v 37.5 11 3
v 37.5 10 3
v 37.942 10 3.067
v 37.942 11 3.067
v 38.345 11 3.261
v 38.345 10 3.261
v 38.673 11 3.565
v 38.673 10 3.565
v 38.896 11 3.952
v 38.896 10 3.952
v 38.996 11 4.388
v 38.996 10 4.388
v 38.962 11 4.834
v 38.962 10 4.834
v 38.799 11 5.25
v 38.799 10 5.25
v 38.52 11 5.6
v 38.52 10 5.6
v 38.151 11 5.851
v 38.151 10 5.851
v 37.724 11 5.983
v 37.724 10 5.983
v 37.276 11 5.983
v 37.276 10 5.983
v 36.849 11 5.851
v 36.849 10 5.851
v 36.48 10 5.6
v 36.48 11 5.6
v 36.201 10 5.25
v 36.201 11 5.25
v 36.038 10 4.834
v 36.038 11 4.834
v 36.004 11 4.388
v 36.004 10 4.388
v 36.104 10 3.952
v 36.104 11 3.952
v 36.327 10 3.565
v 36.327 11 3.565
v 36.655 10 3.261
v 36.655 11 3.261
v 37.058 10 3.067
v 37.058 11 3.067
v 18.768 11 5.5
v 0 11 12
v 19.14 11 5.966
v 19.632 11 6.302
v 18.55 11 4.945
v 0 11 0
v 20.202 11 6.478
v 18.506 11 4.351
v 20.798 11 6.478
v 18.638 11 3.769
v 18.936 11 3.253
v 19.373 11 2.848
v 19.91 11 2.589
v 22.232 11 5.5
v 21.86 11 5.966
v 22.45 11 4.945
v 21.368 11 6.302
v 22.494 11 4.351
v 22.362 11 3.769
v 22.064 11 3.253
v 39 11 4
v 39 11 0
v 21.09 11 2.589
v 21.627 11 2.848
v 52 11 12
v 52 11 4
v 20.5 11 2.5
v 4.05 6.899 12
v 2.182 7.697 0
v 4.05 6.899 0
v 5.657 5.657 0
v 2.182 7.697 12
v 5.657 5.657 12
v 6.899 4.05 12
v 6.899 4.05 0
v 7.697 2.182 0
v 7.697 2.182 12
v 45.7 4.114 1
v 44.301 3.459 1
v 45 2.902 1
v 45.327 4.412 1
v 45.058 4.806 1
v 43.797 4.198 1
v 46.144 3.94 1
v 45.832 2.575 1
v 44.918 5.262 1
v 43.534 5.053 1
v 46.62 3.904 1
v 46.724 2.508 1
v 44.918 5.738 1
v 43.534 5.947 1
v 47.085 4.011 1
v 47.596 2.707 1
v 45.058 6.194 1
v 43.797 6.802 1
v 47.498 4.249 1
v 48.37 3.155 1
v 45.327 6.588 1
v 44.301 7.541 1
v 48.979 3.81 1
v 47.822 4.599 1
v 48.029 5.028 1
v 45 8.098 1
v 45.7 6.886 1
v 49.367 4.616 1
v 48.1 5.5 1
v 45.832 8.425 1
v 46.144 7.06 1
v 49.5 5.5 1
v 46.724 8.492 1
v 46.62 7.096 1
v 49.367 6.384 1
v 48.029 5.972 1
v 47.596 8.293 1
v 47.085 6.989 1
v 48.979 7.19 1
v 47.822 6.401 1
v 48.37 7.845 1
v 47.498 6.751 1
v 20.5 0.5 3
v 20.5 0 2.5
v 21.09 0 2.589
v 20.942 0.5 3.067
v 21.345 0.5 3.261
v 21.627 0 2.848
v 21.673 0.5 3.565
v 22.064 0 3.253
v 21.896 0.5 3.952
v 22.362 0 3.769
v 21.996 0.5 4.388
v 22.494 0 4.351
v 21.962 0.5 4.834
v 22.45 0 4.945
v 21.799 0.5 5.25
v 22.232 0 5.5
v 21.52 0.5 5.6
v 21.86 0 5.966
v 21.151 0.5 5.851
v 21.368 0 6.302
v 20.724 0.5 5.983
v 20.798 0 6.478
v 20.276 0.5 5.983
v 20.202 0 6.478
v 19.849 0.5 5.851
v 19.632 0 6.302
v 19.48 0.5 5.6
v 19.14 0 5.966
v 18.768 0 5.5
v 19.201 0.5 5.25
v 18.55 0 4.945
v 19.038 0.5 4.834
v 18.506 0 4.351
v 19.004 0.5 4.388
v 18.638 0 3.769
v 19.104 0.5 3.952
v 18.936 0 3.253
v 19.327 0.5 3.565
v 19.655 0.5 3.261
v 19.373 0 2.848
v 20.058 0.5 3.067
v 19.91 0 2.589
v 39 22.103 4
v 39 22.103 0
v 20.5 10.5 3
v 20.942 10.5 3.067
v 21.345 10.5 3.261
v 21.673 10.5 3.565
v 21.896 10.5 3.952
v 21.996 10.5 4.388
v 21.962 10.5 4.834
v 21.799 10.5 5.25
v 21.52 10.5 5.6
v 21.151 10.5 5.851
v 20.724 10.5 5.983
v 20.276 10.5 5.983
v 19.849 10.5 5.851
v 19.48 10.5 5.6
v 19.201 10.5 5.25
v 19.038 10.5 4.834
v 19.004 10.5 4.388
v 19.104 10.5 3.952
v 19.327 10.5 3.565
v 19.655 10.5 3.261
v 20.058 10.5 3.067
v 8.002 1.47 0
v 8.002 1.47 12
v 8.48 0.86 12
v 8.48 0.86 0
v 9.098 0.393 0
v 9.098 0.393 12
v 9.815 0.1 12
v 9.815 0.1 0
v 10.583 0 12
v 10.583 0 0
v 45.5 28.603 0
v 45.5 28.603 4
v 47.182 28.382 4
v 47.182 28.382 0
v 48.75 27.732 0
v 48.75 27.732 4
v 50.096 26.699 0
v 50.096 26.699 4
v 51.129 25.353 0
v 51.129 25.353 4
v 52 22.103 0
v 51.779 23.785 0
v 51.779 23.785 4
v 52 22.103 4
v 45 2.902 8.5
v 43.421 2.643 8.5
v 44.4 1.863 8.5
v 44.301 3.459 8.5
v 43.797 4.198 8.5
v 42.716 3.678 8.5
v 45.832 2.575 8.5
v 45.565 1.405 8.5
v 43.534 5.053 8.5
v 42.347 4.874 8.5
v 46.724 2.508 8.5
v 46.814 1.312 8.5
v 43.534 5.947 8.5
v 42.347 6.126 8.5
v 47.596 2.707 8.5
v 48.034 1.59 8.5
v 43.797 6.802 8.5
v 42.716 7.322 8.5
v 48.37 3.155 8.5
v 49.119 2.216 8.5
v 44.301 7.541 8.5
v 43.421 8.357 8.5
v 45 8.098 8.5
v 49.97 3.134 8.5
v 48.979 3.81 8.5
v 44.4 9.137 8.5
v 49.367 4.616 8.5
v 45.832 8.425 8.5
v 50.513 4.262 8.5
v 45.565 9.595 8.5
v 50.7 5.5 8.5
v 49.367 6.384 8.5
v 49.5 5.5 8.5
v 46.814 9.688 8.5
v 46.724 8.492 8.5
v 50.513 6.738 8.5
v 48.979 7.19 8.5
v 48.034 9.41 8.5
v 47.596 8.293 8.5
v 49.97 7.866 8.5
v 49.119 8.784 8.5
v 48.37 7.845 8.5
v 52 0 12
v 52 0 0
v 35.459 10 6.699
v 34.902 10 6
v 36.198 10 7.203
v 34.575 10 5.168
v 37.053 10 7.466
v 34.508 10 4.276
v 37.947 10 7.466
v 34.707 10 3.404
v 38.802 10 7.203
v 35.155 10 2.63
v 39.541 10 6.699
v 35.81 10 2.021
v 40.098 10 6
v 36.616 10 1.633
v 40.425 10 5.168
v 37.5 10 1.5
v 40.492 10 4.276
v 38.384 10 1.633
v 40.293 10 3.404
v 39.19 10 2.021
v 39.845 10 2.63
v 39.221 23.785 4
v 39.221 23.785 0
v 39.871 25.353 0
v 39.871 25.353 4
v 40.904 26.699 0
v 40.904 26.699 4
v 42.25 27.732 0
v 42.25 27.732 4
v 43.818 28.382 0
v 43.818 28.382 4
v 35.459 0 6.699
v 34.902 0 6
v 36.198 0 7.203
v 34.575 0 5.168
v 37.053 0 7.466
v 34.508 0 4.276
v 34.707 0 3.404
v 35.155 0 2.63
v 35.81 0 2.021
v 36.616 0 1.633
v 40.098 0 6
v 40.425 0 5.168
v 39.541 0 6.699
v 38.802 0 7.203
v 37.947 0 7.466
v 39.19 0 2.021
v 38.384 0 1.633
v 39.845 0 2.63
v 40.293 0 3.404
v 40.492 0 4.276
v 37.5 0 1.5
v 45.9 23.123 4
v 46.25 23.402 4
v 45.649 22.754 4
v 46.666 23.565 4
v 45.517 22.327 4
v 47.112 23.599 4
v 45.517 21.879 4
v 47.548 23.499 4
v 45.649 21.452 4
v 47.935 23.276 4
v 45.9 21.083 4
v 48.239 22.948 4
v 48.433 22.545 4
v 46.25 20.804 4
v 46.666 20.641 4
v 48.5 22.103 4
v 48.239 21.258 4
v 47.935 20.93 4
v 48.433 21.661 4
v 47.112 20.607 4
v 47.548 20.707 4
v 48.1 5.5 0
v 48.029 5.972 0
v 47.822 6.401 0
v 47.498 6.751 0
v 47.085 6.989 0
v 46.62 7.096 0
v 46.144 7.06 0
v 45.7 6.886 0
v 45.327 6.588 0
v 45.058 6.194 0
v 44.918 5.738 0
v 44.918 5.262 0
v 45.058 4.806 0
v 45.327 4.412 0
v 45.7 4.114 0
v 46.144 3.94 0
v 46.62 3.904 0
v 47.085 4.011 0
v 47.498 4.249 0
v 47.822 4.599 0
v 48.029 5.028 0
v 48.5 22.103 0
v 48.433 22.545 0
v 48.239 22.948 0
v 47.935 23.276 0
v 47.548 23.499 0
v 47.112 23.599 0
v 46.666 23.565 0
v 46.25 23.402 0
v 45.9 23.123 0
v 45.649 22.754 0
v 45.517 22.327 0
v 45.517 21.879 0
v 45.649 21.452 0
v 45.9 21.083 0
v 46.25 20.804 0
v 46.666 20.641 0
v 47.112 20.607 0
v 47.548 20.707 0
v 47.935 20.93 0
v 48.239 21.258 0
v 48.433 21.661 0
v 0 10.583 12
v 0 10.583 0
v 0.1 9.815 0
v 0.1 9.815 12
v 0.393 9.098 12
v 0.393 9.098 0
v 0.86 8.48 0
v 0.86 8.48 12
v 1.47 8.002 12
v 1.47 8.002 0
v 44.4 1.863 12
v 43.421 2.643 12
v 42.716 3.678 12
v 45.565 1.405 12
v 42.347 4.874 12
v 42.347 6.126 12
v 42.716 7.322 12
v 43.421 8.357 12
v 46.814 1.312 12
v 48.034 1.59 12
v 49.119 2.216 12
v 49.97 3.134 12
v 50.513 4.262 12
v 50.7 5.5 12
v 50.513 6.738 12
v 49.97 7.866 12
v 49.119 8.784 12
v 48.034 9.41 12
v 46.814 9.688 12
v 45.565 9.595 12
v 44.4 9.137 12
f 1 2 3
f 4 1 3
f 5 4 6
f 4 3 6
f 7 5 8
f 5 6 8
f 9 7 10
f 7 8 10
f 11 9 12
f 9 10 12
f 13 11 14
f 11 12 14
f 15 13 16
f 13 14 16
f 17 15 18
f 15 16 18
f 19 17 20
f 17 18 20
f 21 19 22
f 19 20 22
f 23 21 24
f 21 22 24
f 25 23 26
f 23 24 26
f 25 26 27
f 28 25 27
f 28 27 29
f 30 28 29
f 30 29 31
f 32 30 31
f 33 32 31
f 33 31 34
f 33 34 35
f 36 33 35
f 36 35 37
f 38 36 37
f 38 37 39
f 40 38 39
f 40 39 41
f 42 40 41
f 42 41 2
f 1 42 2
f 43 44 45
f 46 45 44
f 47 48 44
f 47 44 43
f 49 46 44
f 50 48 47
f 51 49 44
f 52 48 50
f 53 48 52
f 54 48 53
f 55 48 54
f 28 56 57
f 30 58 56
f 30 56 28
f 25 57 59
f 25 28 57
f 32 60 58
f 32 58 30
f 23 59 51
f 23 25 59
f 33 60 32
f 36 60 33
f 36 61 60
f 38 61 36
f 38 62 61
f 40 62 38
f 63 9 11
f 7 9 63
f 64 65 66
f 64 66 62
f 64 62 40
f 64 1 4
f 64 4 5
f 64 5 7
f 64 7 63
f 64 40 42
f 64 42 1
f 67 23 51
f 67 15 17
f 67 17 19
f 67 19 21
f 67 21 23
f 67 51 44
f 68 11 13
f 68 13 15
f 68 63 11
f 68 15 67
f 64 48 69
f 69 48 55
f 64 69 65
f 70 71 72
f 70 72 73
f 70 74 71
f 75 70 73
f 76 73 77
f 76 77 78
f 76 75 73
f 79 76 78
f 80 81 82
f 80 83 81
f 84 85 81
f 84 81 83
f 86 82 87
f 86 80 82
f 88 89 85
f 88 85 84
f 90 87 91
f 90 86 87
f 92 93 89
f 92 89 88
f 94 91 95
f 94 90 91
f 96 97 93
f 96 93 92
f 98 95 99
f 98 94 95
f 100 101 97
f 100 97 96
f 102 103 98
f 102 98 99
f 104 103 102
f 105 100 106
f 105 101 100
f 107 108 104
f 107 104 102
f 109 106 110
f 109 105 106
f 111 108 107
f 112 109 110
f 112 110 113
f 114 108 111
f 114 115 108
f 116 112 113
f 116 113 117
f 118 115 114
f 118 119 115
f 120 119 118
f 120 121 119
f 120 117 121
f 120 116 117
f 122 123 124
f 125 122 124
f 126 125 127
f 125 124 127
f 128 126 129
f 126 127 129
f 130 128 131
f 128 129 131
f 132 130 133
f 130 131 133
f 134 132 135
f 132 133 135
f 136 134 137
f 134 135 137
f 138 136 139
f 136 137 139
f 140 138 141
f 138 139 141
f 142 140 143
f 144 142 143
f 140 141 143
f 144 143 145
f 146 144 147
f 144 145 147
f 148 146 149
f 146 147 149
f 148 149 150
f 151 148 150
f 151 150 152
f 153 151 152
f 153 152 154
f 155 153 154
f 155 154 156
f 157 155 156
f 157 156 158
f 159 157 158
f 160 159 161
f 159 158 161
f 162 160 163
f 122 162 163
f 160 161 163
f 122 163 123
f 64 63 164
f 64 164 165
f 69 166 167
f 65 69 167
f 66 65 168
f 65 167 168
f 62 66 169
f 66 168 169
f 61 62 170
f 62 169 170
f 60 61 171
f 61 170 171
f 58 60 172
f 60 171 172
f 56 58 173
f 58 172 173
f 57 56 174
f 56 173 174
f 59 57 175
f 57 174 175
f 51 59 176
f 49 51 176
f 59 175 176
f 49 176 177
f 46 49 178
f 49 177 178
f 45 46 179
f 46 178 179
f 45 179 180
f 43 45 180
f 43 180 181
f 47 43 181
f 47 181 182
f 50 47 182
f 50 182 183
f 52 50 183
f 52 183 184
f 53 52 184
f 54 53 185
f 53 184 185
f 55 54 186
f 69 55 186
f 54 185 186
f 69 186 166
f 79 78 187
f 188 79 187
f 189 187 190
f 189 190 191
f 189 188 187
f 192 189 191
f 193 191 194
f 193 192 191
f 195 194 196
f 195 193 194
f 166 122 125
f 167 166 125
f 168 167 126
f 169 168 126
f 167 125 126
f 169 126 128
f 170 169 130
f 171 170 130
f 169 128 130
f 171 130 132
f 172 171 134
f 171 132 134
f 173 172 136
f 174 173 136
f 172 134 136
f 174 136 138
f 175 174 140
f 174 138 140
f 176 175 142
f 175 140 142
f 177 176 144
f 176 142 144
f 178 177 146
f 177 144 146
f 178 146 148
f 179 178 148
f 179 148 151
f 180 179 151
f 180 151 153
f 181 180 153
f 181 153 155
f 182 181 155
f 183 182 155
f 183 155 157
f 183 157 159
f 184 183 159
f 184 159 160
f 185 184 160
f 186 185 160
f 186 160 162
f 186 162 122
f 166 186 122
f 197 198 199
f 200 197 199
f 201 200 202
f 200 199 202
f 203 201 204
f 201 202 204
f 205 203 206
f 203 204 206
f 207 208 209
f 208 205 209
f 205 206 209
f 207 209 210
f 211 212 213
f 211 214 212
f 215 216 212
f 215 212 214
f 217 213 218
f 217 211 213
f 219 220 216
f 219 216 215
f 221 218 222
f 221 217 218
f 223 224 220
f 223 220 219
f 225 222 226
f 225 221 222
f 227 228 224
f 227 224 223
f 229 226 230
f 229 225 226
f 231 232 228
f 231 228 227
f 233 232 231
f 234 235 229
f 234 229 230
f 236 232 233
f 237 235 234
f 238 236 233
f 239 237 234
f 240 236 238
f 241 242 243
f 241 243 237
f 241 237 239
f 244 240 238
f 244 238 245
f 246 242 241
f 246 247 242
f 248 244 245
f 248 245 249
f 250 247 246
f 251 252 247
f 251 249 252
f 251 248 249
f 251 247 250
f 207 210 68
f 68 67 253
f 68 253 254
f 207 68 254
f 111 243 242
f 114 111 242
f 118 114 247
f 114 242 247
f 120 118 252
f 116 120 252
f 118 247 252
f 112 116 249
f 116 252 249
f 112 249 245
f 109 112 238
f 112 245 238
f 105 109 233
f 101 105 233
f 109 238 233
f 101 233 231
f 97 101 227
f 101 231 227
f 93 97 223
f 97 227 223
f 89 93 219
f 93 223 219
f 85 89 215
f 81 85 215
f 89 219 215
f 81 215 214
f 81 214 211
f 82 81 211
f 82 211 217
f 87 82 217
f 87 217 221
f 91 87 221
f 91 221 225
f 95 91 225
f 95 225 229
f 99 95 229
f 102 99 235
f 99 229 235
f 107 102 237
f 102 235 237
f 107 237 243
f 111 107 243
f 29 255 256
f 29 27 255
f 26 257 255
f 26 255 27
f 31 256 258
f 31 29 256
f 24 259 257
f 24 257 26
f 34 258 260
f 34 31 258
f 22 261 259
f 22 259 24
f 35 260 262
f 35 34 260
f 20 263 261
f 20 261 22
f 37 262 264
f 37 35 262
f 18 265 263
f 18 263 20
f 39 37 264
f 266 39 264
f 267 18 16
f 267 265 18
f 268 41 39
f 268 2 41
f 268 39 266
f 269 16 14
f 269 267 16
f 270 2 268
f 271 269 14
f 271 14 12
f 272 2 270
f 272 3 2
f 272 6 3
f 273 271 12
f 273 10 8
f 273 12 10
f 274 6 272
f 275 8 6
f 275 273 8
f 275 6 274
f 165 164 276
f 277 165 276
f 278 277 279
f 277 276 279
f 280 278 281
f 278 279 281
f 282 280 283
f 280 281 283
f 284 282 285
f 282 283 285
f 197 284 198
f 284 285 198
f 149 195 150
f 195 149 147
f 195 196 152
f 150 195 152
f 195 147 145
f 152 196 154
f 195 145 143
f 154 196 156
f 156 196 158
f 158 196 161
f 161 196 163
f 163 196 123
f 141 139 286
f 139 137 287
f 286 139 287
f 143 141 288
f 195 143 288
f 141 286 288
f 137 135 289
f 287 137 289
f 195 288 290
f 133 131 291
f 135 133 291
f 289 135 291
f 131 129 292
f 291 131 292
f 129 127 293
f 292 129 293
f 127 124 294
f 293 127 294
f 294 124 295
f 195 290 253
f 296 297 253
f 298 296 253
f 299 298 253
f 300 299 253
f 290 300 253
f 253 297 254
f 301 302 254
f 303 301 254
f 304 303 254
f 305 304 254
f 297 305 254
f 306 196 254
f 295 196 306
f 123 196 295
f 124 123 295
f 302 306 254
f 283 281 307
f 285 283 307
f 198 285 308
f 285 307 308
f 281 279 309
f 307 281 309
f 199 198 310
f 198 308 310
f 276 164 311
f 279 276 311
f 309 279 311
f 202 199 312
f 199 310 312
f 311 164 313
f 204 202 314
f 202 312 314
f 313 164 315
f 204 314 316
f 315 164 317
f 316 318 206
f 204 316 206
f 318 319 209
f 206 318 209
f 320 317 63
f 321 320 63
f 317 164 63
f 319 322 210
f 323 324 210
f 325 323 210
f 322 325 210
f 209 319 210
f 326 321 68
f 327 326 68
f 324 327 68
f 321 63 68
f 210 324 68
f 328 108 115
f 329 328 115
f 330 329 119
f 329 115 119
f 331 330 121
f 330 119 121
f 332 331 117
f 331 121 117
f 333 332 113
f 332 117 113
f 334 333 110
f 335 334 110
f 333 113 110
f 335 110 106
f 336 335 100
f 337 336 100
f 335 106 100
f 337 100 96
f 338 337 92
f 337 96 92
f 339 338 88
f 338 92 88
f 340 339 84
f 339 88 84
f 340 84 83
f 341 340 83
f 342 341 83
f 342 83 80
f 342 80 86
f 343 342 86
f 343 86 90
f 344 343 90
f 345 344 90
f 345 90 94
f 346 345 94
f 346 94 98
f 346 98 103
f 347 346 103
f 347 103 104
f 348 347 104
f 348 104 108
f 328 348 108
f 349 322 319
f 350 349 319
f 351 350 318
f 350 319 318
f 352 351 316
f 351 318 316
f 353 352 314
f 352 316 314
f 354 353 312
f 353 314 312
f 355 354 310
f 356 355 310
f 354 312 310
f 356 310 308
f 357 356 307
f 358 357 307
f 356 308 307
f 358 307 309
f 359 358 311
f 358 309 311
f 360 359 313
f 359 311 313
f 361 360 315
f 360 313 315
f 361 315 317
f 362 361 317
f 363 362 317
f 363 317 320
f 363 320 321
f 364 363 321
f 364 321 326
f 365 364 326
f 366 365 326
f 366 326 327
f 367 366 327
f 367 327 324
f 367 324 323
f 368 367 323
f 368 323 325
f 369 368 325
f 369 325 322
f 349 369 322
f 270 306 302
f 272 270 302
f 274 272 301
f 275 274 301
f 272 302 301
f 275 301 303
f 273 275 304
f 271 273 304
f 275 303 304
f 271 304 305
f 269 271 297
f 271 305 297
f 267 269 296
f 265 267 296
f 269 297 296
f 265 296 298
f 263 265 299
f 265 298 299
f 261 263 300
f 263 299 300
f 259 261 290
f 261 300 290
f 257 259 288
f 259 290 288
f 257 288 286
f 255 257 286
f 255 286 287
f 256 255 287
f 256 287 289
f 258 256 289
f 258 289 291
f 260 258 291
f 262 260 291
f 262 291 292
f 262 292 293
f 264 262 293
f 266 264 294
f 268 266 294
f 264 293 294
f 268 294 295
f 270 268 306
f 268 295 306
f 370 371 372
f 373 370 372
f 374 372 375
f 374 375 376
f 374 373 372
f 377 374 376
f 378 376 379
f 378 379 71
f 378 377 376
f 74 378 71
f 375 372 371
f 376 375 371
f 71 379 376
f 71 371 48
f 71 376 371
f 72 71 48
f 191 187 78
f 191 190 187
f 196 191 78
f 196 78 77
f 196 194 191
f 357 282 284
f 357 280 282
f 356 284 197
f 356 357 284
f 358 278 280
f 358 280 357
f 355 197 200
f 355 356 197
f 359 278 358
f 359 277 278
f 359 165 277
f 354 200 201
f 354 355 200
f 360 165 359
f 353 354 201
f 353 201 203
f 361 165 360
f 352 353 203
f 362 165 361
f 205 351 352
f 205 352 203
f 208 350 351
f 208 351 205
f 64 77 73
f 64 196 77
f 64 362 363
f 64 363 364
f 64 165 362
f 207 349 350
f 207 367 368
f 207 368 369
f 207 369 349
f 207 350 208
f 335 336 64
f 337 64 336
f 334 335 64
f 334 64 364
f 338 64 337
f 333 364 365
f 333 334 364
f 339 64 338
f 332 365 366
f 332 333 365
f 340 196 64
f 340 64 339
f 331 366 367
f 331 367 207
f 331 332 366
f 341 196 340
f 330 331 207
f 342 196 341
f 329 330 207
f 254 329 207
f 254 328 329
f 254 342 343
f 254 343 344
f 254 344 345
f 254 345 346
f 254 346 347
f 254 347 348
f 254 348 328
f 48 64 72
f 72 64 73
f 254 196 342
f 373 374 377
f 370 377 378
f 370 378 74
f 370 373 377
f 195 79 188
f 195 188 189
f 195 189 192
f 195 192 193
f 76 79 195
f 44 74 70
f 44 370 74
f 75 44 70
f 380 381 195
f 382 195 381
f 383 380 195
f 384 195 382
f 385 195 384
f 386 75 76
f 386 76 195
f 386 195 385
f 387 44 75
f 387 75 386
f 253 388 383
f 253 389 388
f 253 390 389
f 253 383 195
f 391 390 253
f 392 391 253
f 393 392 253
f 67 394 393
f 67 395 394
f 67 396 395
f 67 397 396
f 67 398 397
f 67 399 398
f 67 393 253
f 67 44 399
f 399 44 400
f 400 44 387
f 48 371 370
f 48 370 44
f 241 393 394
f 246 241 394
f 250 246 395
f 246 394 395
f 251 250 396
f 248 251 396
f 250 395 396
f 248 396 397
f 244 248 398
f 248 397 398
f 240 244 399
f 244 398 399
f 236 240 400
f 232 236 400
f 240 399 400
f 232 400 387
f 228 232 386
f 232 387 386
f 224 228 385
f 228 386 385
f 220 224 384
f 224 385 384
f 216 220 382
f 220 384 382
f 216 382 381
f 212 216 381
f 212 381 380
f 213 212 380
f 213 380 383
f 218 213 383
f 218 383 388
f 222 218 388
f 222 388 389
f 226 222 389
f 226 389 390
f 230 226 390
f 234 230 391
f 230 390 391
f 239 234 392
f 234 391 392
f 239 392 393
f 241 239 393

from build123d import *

# Parameters (mm, degrees)
SKETCH1_W           = 52
SKETCH1_H           = 11
BOSS_EXTRUDE1_DEPTH = 12
SKETCH3_W           = 12
SKETCH3_H           = 8
CUT_REVOLVE1_ANGLE  = 90
SKETCH4_W           = 13
SKETCH4_H           = 4
BOSS_EXTRUDE2_DEPTH = 17.603
CUT_EXTRUDE1_DEPTH  = 60.884318557
SKETCH7_R           = 1.5
CUT_EXTRUDE2_DEPTH  = 60.884318557
SKETCH8_R           = 4.2
CUT_EXTRUDE3_DEPTH  = 3.5
SKETCH9_R           = 3
CUT_EXTRUDE4_DEPTH  = 7.5
SKETCH10_R          = 1.6
CUT_EXTRUDE5_DEPTH  = 61.358359893
SKETCH11_R          = 1.5
CUT_EXTRUDE6_DEPTH  = 61.548588827
SKETCH13_R          = 3
CUT_EXTRUDE7_DEPTH  = 10
CHAMFER3_SIZE       = 0.5
FILLET11_R          = 3
FILLET12_R          = 3


with BuildPart() as part:
    # Sketch1 → Boss-Extrude1 (new body)
    with BuildSketch(Plane.XY):
        with Locations((26, 5.5)):
            Rectangle(SKETCH1_W, SKETCH1_H)
    extrude(amount=BOSS_EXTRUDE1_DEPTH)

    # Sketch3 → Cut-Revolve1 (revolve, cut)
    with BuildSketch(Plane.ZY):
        with Locations((6, 4)):
            Rectangle(SKETCH3_W, SKETCH3_H)
    revolve(axis=Axis((0, 0, 0), (0, 0, -1)), revolution_arc=CUT_REVOLVE1_ANGLE, mode=Mode.SUBTRACT)

    # Sketch4 → Boss-Extrude2 (add)
    with BuildSketch(Plane(origin=(0, 11, 0), x_dir=(1, 0, 0), z_dir=(0, 1, 0))):
        with Locations((45.5, -2)):
            Rectangle(SKETCH4_W, SKETCH4_H)
    extrude(amount=BOSS_EXTRUDE2_DEPTH)

    # Sketch6 → Cut-Extrude1 (cut, through all)
    with BuildSketch(Plane.XY.offset(4)):
        with BuildLine():
            ThreePointArc((45.5, 28.603), (50.096194078, 26.699194078), (52, 22.103))
            Line((52, 22.103), (52, 28.603))
            Line((52, 28.603), (45.5, 28.603))
        make_face()
        with BuildLine():
            Line((39, 28.603), (39, 22.103))
            ThreePointArc((39, 22.103), (40.903805922, 26.699194078), (45.5, 28.603))
            Line((45.5, 28.603), (39, 28.603))
        make_face()
    extrude(amount=-CUT_EXTRUDE1_DEPTH, mode=Mode.SUBTRACT)

    # Sketch7 → Cut-Extrude2 (cut, through all)
    with BuildSketch(Plane.XY.offset(4)):
        with Locations((47, 22.103)):
            Circle(SKETCH7_R)
    extrude(amount=-CUT_EXTRUDE2_DEPTH, mode=Mode.SUBTRACT)

    # Sketch8 → Cut-Extrude3 (cut)
    with BuildSketch(Plane.XY.offset(12)):
        with Locations((46.5, 5.5)):
            Circle(SKETCH8_R)
    extrude(amount=-CUT_EXTRUDE3_DEPTH, mode=Mode.SUBTRACT)

    # Sketch9 → Cut-Extrude4 (cut)
    with BuildSketch(Plane.XY.offset(8.5)):
        with Locations((46.5, 5.5)):
            Circle(SKETCH9_R)
    extrude(amount=-CUT_EXTRUDE4_DEPTH, mode=Mode.SUBTRACT)

    # Sketch10 → Cut-Extrude5 (cut, through all)
    with BuildSketch(Plane.XY.offset(1)):
        with Locations((46.5, 5.5)):
            Circle(SKETCH10_R)
    extrude(amount=-CUT_EXTRUDE5_DEPTH, mode=Mode.SUBTRACT)

    # Sketch11 → Cut-Extrude6 (cut, through all)
    with BuildSketch(Plane.XZ):
        with Locations(Location((37.5, 4.5, 0), (0, 0, 270))):
            Circle(SKETCH11_R)
        with Locations(Location((20.5, 4.5, 0), (0, 0, 270))):
            Circle(SKETCH11_R)
    extrude(amount=-CUT_EXTRUDE6_DEPTH, mode=Mode.SUBTRACT)

    # Sketch13 → Cut-Extrude7 (cut)
    with BuildSketch(Plane.XZ):
        with Locations(Location((37.5, 4.5, 0), (0, 0, 270))):
            Circle(SKETCH13_R)
    extrude(amount=-CUT_EXTRUDE7_DEPTH, mode=Mode.SUBTRACT)

    # Chamfer3
    chamfer3_edges = [part.edges().sort_by_distance(p)[0] for p in [
        (20.5, 11, 6),
        (20.5, 0, 6),
    ]]
    chamfer(chamfer3_edges, length=CHAMFER3_SIZE)

    # Fillet11
    fillet11_edges = [part.edges().sort_by_distance(p)[0] for p in [
        (0, 8, 6),
    ]]
    fillet(fillet11_edges, radius=FILLET11_R)

    # Fillet12
    fillet12_edges = [part.edges().sort_by_distance(p)[0] for p in [
        (8, 0, 6),
    ]]
    fillet(fillet12_edges, radius=FILLET12_R)


solid = part.part
